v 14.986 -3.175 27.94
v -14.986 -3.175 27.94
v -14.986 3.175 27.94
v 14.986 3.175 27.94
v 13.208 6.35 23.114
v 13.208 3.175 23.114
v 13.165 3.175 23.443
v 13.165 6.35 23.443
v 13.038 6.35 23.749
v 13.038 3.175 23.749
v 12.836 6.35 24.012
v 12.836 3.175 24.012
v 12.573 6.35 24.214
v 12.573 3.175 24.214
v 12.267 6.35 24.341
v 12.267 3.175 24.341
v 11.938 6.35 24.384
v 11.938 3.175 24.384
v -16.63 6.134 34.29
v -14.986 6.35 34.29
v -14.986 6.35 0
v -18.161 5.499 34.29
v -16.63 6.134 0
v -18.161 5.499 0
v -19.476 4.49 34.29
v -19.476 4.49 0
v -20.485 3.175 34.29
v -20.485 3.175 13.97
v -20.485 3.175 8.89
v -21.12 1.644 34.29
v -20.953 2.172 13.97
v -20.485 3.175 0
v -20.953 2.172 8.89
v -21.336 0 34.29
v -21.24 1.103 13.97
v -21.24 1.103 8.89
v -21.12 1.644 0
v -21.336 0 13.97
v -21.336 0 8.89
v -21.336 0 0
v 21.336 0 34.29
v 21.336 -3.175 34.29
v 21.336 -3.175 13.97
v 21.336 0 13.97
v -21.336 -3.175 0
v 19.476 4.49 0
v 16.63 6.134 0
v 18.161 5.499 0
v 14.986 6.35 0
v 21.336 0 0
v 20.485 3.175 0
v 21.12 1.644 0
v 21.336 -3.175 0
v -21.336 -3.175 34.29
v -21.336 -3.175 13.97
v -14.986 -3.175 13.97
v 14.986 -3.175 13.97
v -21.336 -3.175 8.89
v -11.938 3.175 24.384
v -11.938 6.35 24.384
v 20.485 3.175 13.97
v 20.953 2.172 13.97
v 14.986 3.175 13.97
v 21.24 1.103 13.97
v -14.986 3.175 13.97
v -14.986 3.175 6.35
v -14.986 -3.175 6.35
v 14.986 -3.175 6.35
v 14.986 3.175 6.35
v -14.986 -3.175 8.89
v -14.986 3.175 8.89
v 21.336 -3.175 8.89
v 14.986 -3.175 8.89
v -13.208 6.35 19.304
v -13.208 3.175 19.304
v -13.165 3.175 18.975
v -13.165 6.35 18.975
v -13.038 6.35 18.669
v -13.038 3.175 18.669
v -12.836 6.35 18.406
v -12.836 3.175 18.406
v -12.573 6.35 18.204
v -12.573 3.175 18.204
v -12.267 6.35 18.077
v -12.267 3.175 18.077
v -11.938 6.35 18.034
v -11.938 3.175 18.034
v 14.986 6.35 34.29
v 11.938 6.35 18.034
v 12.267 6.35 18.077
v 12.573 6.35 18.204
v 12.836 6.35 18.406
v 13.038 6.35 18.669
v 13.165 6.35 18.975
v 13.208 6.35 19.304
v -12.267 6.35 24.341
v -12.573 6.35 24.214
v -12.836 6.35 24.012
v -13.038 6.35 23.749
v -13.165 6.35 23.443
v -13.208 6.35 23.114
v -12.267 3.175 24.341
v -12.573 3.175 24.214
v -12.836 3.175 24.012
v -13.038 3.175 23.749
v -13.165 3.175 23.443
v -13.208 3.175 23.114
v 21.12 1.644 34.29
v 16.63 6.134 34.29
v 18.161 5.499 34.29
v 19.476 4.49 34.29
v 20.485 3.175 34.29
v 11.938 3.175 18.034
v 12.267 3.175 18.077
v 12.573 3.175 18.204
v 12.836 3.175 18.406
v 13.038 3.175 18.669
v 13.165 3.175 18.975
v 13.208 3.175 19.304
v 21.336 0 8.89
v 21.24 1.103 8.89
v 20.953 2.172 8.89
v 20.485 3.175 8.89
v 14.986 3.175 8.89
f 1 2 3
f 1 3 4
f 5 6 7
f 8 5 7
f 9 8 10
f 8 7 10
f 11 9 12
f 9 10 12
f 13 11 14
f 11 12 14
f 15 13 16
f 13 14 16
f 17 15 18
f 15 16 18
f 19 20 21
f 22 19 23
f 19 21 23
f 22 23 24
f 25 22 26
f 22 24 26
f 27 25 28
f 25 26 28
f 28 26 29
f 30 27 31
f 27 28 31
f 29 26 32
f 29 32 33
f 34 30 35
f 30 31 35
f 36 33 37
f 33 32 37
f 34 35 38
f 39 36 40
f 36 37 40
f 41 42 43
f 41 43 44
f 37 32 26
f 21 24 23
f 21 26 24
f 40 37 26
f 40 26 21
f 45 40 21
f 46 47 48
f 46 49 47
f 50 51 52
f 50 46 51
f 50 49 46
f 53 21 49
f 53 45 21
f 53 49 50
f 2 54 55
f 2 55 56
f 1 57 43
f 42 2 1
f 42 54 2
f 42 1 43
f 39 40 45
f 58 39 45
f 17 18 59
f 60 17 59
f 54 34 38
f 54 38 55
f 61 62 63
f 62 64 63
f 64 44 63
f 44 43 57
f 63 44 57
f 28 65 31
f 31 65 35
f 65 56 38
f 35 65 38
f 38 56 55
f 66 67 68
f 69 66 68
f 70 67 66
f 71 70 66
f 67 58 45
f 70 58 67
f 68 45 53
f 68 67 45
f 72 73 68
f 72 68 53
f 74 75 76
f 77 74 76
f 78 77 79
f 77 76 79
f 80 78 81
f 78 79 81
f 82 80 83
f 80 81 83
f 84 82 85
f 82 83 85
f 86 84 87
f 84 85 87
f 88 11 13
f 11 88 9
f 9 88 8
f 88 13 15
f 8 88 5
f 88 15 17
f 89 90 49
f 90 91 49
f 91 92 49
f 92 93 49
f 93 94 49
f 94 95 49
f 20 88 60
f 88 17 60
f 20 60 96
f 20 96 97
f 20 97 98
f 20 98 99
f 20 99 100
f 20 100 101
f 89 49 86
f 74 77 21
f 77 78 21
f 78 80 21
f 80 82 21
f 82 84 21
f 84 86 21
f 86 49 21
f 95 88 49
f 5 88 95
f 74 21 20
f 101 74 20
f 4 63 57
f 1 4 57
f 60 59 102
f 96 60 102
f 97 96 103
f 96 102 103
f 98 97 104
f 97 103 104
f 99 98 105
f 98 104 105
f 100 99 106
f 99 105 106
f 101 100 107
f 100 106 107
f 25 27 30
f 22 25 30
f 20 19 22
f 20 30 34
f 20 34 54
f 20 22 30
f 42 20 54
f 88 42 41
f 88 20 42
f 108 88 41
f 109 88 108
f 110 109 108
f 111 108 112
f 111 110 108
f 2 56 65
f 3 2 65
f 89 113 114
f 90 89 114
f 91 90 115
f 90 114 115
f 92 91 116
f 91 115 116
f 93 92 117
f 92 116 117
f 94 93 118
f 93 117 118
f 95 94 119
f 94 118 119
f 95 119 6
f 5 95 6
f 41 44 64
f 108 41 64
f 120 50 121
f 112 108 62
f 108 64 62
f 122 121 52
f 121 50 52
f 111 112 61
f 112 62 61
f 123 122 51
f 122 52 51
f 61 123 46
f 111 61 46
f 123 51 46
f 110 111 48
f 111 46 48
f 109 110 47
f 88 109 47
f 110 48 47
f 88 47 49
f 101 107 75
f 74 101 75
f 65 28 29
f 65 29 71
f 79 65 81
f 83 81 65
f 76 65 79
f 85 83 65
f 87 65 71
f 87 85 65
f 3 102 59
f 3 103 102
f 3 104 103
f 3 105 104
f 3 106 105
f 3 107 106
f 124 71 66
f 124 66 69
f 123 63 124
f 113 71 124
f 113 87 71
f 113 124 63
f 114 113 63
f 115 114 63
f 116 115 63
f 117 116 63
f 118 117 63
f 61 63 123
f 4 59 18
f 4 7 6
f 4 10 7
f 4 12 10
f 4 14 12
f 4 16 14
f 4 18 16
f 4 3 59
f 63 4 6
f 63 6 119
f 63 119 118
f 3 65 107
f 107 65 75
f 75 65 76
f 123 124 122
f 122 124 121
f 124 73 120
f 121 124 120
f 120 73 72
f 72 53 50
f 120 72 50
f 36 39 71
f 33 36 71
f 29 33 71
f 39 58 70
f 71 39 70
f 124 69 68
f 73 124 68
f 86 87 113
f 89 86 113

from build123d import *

# Parameters (mm, degrees)
F1_DEPTH = 34.29
F2_W     = 29.972
F2_H     = 6.35
F3_DEPTH = 6.35
F2_W_2   = 6.35
F2_H_2   = 5.08
F2_W_3   = 36.322
F4_DEPTH = 6.35
F5_DEPTH = 9.526


with BuildPart() as f1:
    # F0 (on Top) → F1 (new body)
    with BuildSketch(Plane.XY):
        with BuildLine():
            Line((-21.336, -3.175), (-14.986, -3.175))
            Line((-14.986, -3.175), (-14.986, 3.175))
            Line((-14.986, 3.175), (14.986, 3.175))
            Line((14.986, 3.175), (14.986, -3.175))
            Line((14.986, -3.175), (21.336, -3.175))
            Line((21.336, -3.175), (21.336, 0))
            ThreePointArc((21.336, 0), (19.476128, 4.490128), (14.986, 6.35))
            Line((14.986, 6.35), (-14.986, 6.35))
            ThreePointArc((-14.986, 6.35), (-19.476128, 4.490128), (-21.336, 0))
            Line((-21.336, 0), (-21.336, -3.175))
        make_face()
    extrude(amount=F1_DEPTH)

    # F2 (on face) → F3 (join, through all)
    with BuildSketch(Plane.XZ.offset(3.175)):
        with Locations((0, 3.175)):
            Rectangle(F2_W, F2_H)
        with Locations((0, 31.115)):
            Rectangle(F2_W, F2_H)
    extrude(amount=-F3_DEPTH)

    # F2 (on face) → F4 (cut, through all)
    with BuildSketch(Plane.XZ.offset(3.175)):
        with Locations((-18.161, 11.43)):
            Rectangle(F2_W_2, F2_H_2)
        with Locations((3.175, 11.43)):
            Rectangle(F2_W_3, F2_H_2)
    extrude(amount=-F4_DEPTH, mode=Mode.SUBTRACT)

    # F2 (on face) → F5 (cut, through all)
    with BuildSketch(Plane.XZ.offset(3.175)):
        with BuildLine():
            ThreePointArc((-13.208, 19.304), (-12.836026, 18.405974), (-11.938, 18.034))
            Line((-11.938, 18.034), (0, 18.034))
            Line((0, 18.034), (11.938, 18.034))
            ThreePointArc((11.938, 18.034), (12.836026, 18.405974), (13.208, 19.304))
            Line((13.208, 19.304), (13.208, 23.114))
            ThreePointArc((13.208, 23.114), (12.836026, 24.012026), (11.938, 24.384))
            Line((11.938, 24.384), (-11.938, 24.384))
            ThreePointArc((-11.938, 24.384), (-12.836026, 24.012026), (-13.208, 23.114))
            Line((-13.208, 23.114), (-13.208, 19.304))
        make_face()
    extrude(amount=-F5_DEPTH, mode=Mode.SUBTRACT)


solid = f1.part
